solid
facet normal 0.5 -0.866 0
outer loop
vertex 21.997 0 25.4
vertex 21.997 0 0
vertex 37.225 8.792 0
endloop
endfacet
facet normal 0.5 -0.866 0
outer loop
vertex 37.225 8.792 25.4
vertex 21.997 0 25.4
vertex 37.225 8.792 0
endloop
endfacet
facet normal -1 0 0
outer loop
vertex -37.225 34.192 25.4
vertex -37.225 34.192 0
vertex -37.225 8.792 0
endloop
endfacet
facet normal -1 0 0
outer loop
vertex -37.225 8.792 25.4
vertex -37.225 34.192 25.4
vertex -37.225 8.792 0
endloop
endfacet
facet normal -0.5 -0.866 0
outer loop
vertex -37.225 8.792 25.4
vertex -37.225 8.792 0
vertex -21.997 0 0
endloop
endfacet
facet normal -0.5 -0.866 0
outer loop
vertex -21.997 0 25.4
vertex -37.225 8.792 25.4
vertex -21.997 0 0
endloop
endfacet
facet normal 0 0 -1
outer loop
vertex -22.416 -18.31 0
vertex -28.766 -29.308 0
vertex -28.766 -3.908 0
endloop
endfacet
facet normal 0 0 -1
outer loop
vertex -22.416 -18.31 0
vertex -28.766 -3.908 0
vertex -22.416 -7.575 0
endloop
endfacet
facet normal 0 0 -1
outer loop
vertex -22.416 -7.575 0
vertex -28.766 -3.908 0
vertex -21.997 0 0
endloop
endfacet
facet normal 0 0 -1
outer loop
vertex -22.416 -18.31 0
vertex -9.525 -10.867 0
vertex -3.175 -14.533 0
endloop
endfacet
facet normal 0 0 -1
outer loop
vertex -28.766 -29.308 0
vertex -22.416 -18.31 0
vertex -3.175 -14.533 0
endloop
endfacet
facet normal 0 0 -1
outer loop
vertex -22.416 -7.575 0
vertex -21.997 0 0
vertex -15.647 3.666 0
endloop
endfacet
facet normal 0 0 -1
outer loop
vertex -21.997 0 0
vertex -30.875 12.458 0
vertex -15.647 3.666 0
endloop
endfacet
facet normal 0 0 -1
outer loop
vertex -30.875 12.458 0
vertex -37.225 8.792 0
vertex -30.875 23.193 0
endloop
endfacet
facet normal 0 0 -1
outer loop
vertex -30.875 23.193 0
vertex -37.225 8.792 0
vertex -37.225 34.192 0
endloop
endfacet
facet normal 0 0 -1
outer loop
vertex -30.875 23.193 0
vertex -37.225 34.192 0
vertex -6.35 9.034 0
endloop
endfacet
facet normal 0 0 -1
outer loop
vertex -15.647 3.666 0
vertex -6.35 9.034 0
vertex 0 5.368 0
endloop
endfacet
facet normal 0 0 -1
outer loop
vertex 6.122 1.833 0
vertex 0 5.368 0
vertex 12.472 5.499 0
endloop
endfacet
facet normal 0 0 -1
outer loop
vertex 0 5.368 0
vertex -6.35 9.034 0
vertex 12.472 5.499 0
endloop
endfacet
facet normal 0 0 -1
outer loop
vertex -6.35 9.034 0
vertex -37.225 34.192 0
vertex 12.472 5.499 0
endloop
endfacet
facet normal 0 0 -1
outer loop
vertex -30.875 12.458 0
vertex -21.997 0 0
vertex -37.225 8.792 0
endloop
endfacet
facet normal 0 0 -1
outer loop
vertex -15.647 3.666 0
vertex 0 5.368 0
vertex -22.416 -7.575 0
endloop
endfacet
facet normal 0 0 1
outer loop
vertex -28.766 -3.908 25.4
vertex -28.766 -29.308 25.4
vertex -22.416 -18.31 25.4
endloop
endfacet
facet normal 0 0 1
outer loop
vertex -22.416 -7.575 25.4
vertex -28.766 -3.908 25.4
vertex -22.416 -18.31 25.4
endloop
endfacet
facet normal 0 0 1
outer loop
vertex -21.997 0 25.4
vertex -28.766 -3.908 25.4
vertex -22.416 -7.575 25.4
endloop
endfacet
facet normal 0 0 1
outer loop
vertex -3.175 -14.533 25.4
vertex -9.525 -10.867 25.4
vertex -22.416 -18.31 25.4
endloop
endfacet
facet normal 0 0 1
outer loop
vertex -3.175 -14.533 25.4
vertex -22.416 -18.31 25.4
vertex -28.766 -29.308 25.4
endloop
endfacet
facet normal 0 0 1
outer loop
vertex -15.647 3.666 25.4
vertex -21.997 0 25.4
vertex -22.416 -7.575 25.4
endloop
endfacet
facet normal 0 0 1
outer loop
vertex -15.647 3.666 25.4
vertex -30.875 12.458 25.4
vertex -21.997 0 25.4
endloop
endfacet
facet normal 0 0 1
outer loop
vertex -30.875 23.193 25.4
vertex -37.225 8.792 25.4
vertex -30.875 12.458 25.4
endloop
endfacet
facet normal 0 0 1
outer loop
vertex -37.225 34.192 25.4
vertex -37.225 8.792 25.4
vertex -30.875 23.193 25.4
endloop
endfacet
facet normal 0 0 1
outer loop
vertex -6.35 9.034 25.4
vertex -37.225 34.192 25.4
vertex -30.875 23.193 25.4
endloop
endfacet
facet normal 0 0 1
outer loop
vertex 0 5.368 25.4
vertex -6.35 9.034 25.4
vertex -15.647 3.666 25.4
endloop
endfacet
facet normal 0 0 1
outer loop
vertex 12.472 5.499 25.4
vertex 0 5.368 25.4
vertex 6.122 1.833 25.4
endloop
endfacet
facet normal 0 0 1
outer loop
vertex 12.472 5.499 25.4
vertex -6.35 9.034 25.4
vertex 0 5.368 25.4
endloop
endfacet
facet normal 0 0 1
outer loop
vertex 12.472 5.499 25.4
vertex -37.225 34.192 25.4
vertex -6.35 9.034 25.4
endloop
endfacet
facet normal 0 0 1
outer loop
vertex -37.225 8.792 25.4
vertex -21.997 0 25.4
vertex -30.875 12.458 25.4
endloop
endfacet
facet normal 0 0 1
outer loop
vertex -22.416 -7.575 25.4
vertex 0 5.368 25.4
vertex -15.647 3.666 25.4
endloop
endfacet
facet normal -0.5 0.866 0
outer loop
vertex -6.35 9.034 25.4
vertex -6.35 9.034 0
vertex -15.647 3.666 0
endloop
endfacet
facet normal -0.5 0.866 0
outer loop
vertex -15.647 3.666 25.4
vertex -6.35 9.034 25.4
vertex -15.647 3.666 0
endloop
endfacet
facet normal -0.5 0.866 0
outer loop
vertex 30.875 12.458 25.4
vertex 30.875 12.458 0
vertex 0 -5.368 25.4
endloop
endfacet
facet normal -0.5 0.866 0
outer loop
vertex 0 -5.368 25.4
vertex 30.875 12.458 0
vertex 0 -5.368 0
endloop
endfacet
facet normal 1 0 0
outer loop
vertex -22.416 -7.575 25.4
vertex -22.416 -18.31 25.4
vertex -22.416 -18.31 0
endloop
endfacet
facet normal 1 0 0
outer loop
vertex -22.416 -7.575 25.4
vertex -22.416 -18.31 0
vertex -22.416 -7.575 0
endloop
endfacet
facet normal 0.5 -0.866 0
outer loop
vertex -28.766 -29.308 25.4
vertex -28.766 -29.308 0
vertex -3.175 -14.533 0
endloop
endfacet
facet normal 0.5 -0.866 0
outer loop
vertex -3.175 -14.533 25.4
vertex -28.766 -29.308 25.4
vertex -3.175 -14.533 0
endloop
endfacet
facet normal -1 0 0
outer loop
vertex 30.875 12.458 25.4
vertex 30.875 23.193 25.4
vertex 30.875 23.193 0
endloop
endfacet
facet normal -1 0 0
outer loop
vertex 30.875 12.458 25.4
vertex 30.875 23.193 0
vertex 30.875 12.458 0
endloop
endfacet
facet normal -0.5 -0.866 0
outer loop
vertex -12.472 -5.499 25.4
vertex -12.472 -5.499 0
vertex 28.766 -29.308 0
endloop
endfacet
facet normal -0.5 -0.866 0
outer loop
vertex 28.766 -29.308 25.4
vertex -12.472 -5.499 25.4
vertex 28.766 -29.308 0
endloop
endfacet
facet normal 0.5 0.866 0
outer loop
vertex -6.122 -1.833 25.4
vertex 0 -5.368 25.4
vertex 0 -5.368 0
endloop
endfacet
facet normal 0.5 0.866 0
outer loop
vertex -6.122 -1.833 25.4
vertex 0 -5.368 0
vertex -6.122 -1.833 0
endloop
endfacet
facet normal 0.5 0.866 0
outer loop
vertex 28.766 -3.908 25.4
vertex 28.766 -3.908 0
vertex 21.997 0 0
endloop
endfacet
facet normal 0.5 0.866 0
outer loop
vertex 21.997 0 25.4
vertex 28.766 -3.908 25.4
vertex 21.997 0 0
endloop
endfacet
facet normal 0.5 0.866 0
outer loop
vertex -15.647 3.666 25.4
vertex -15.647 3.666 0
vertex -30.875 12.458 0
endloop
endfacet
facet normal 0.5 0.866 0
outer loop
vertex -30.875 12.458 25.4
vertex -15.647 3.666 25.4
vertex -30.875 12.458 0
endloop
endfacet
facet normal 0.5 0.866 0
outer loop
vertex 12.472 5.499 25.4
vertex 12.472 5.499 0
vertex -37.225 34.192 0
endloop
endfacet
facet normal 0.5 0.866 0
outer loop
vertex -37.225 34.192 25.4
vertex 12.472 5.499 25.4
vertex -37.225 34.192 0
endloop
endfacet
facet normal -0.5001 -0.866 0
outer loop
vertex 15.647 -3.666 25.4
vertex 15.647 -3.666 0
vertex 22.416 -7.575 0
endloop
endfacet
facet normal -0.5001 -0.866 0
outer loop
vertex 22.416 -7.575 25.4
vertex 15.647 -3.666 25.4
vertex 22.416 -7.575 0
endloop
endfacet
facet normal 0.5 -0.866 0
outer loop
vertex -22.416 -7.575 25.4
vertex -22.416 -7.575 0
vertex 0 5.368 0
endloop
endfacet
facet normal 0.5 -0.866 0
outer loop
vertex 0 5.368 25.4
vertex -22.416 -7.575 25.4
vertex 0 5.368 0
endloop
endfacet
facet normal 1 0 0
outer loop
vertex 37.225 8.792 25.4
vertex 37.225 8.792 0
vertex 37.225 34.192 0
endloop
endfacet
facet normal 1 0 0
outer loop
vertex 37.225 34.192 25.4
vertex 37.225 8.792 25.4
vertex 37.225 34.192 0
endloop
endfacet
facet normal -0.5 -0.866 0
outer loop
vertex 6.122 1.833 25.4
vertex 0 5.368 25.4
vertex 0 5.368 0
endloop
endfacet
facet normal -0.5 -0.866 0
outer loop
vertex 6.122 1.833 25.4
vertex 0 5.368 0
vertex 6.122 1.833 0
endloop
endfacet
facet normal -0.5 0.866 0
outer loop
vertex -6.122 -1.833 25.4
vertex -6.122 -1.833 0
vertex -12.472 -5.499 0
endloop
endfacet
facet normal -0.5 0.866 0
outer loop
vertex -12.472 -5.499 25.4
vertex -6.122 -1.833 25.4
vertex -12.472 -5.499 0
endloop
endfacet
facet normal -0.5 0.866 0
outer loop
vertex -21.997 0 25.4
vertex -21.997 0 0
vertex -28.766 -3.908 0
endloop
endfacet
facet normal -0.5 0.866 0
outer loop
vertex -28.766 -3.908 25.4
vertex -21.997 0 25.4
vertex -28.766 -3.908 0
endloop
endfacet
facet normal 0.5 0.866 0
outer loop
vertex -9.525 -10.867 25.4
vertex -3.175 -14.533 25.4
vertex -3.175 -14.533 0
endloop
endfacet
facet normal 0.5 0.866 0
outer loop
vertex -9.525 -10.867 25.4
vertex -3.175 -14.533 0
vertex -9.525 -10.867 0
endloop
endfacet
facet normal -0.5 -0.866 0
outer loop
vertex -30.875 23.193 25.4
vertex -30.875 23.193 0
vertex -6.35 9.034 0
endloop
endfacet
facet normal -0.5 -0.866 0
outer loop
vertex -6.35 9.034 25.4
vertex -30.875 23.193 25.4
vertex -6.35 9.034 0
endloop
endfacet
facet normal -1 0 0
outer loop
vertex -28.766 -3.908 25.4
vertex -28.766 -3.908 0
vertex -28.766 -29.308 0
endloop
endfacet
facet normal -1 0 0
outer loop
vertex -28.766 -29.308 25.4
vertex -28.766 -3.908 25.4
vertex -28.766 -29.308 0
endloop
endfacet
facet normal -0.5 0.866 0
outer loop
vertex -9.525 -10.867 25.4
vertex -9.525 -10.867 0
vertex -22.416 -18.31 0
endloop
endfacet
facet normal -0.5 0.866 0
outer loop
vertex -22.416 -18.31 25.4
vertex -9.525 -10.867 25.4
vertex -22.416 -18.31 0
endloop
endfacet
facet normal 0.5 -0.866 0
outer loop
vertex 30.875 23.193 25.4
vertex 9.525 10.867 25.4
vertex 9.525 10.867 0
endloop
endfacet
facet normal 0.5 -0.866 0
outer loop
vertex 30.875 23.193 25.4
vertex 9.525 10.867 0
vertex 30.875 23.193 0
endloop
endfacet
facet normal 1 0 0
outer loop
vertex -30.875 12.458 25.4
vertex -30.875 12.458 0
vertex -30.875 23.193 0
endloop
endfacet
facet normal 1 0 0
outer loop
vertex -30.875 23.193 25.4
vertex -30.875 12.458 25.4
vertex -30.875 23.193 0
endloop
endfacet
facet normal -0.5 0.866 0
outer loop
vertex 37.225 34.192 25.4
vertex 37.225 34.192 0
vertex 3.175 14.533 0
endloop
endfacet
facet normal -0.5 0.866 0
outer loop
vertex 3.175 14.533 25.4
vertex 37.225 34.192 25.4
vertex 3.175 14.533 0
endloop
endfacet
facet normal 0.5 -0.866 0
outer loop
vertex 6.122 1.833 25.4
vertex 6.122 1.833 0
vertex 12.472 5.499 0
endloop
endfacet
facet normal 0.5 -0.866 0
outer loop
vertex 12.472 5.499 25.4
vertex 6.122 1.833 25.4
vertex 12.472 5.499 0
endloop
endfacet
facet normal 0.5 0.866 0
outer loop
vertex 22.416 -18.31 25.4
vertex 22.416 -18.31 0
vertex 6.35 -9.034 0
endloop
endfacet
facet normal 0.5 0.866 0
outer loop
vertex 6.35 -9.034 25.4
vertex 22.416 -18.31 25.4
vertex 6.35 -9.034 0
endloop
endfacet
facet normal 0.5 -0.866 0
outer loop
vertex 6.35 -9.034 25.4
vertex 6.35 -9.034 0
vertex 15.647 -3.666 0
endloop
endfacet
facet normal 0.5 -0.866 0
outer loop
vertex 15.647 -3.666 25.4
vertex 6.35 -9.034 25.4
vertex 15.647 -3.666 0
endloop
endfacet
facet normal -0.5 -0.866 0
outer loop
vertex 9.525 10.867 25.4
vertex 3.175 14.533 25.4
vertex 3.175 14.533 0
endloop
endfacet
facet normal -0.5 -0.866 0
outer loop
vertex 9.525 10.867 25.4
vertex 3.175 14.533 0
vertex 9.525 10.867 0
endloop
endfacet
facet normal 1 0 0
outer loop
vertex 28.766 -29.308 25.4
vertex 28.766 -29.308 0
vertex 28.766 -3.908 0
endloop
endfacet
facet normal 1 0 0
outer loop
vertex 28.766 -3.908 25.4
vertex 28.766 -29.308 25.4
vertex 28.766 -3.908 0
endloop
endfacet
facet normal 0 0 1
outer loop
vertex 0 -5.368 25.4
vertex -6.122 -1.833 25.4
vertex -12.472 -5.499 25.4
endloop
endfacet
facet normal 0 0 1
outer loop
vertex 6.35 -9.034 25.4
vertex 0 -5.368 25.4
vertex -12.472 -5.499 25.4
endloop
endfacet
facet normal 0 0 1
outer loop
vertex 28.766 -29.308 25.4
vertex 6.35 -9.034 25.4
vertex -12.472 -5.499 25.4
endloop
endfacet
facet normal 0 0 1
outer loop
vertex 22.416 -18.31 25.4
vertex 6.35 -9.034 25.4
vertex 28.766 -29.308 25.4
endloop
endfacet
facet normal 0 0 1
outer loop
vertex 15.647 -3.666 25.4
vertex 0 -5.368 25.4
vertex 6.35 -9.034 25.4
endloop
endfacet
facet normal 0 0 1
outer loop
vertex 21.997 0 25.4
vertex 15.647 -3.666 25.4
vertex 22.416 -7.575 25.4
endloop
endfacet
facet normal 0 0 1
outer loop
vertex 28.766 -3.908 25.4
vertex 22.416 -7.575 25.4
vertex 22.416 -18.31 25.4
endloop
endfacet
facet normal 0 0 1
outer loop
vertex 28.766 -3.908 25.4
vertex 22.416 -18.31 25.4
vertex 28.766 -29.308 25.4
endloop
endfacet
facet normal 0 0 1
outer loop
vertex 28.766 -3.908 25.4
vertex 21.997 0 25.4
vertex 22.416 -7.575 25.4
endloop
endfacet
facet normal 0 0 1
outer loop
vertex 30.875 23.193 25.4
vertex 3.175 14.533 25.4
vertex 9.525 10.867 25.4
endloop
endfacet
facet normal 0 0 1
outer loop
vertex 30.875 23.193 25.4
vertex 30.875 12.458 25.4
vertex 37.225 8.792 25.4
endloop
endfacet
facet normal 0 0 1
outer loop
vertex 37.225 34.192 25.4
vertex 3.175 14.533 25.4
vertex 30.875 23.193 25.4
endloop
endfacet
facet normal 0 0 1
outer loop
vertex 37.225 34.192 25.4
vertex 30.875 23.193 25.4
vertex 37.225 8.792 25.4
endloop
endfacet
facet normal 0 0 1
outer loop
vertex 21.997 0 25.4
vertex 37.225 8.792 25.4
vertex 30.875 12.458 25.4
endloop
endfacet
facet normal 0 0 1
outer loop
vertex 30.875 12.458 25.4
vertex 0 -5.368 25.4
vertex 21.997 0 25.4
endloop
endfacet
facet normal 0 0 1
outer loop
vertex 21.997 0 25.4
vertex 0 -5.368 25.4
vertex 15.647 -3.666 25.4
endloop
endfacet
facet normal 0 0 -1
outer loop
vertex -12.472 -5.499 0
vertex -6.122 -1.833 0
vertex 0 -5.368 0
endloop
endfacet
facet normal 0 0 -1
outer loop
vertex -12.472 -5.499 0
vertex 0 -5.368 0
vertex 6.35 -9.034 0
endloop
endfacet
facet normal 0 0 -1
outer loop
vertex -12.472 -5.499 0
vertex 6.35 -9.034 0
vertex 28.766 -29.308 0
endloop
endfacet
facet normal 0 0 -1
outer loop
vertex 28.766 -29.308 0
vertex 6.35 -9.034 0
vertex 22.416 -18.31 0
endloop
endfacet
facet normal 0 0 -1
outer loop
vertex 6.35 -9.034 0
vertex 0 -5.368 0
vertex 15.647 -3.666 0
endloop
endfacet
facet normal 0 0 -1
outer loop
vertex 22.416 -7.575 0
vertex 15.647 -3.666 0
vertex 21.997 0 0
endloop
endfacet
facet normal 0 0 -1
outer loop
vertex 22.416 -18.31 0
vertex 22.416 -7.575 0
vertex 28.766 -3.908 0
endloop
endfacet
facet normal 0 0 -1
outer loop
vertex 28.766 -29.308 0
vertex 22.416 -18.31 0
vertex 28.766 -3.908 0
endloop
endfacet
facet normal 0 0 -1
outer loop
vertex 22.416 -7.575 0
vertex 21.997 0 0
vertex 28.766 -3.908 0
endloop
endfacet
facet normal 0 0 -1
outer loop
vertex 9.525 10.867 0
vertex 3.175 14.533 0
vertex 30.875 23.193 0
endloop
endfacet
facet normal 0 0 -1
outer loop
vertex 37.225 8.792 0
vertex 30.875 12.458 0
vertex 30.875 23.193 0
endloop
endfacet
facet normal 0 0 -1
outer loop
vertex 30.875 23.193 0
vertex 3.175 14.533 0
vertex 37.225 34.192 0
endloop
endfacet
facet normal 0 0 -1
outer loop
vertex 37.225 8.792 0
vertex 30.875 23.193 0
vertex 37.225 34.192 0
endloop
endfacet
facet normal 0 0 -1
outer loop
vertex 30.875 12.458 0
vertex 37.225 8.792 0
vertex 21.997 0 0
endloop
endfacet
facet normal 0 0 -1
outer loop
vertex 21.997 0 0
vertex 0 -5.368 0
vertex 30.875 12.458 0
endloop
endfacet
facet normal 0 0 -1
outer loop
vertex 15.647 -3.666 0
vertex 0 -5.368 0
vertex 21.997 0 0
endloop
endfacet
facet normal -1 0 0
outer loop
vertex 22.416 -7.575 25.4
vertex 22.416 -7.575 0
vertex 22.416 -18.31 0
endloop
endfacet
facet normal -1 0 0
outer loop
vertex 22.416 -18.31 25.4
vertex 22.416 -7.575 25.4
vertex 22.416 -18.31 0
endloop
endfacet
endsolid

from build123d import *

# Parameters (mm, degrees)
F2_DEPTH = 25.4


with BuildPart() as f2:
    # F1 (on Top) → F2 (new body)
    with BuildSketch(Plane.XY):
        Polygon((12.472045, 5.499261), (-37.224668, 34.191672), (-37.224668, 8.791672), (-21.997045, 0), (-28.766468, -3.908328), (-28.766468, -29.308328), (-3.175, -14.533087), (-9.525, -10.866913), (-22.416468, -18.309805), (-22.416468, -7.574502), (-1e-06, 5.367651), (6.122044, 1.833086), align=None)
        Polygon((-30.874667, 12.457847), (-30.874667, 23.193147), (-6.350001, 9.033825), (-15.647044, 3.666175), align=None, mode=Mode.SUBTRACT)
        Polygon((-12.472045, -5.499261), (28.766468, -29.308328), (28.766468, -3.908328), (21.997045, 0), (37.224668, 8.791672), (37.224668, 34.191672), (3.175, 14.533087), (9.525, 10.866913), (30.874668, 23.193149), (30.874668, 12.457846), (1e-06, -5.367651), (-6.122044, -1.833086), align=None)
        Polygon((15.647044, -3.666175), (22.416467, -7.574503), (22.416467, -18.309803), (6.350001, -9.033825), align=None, mode=Mode.SUBTRACT)
    extrude(amount=F2_DEPTH)


solid = f2.part
